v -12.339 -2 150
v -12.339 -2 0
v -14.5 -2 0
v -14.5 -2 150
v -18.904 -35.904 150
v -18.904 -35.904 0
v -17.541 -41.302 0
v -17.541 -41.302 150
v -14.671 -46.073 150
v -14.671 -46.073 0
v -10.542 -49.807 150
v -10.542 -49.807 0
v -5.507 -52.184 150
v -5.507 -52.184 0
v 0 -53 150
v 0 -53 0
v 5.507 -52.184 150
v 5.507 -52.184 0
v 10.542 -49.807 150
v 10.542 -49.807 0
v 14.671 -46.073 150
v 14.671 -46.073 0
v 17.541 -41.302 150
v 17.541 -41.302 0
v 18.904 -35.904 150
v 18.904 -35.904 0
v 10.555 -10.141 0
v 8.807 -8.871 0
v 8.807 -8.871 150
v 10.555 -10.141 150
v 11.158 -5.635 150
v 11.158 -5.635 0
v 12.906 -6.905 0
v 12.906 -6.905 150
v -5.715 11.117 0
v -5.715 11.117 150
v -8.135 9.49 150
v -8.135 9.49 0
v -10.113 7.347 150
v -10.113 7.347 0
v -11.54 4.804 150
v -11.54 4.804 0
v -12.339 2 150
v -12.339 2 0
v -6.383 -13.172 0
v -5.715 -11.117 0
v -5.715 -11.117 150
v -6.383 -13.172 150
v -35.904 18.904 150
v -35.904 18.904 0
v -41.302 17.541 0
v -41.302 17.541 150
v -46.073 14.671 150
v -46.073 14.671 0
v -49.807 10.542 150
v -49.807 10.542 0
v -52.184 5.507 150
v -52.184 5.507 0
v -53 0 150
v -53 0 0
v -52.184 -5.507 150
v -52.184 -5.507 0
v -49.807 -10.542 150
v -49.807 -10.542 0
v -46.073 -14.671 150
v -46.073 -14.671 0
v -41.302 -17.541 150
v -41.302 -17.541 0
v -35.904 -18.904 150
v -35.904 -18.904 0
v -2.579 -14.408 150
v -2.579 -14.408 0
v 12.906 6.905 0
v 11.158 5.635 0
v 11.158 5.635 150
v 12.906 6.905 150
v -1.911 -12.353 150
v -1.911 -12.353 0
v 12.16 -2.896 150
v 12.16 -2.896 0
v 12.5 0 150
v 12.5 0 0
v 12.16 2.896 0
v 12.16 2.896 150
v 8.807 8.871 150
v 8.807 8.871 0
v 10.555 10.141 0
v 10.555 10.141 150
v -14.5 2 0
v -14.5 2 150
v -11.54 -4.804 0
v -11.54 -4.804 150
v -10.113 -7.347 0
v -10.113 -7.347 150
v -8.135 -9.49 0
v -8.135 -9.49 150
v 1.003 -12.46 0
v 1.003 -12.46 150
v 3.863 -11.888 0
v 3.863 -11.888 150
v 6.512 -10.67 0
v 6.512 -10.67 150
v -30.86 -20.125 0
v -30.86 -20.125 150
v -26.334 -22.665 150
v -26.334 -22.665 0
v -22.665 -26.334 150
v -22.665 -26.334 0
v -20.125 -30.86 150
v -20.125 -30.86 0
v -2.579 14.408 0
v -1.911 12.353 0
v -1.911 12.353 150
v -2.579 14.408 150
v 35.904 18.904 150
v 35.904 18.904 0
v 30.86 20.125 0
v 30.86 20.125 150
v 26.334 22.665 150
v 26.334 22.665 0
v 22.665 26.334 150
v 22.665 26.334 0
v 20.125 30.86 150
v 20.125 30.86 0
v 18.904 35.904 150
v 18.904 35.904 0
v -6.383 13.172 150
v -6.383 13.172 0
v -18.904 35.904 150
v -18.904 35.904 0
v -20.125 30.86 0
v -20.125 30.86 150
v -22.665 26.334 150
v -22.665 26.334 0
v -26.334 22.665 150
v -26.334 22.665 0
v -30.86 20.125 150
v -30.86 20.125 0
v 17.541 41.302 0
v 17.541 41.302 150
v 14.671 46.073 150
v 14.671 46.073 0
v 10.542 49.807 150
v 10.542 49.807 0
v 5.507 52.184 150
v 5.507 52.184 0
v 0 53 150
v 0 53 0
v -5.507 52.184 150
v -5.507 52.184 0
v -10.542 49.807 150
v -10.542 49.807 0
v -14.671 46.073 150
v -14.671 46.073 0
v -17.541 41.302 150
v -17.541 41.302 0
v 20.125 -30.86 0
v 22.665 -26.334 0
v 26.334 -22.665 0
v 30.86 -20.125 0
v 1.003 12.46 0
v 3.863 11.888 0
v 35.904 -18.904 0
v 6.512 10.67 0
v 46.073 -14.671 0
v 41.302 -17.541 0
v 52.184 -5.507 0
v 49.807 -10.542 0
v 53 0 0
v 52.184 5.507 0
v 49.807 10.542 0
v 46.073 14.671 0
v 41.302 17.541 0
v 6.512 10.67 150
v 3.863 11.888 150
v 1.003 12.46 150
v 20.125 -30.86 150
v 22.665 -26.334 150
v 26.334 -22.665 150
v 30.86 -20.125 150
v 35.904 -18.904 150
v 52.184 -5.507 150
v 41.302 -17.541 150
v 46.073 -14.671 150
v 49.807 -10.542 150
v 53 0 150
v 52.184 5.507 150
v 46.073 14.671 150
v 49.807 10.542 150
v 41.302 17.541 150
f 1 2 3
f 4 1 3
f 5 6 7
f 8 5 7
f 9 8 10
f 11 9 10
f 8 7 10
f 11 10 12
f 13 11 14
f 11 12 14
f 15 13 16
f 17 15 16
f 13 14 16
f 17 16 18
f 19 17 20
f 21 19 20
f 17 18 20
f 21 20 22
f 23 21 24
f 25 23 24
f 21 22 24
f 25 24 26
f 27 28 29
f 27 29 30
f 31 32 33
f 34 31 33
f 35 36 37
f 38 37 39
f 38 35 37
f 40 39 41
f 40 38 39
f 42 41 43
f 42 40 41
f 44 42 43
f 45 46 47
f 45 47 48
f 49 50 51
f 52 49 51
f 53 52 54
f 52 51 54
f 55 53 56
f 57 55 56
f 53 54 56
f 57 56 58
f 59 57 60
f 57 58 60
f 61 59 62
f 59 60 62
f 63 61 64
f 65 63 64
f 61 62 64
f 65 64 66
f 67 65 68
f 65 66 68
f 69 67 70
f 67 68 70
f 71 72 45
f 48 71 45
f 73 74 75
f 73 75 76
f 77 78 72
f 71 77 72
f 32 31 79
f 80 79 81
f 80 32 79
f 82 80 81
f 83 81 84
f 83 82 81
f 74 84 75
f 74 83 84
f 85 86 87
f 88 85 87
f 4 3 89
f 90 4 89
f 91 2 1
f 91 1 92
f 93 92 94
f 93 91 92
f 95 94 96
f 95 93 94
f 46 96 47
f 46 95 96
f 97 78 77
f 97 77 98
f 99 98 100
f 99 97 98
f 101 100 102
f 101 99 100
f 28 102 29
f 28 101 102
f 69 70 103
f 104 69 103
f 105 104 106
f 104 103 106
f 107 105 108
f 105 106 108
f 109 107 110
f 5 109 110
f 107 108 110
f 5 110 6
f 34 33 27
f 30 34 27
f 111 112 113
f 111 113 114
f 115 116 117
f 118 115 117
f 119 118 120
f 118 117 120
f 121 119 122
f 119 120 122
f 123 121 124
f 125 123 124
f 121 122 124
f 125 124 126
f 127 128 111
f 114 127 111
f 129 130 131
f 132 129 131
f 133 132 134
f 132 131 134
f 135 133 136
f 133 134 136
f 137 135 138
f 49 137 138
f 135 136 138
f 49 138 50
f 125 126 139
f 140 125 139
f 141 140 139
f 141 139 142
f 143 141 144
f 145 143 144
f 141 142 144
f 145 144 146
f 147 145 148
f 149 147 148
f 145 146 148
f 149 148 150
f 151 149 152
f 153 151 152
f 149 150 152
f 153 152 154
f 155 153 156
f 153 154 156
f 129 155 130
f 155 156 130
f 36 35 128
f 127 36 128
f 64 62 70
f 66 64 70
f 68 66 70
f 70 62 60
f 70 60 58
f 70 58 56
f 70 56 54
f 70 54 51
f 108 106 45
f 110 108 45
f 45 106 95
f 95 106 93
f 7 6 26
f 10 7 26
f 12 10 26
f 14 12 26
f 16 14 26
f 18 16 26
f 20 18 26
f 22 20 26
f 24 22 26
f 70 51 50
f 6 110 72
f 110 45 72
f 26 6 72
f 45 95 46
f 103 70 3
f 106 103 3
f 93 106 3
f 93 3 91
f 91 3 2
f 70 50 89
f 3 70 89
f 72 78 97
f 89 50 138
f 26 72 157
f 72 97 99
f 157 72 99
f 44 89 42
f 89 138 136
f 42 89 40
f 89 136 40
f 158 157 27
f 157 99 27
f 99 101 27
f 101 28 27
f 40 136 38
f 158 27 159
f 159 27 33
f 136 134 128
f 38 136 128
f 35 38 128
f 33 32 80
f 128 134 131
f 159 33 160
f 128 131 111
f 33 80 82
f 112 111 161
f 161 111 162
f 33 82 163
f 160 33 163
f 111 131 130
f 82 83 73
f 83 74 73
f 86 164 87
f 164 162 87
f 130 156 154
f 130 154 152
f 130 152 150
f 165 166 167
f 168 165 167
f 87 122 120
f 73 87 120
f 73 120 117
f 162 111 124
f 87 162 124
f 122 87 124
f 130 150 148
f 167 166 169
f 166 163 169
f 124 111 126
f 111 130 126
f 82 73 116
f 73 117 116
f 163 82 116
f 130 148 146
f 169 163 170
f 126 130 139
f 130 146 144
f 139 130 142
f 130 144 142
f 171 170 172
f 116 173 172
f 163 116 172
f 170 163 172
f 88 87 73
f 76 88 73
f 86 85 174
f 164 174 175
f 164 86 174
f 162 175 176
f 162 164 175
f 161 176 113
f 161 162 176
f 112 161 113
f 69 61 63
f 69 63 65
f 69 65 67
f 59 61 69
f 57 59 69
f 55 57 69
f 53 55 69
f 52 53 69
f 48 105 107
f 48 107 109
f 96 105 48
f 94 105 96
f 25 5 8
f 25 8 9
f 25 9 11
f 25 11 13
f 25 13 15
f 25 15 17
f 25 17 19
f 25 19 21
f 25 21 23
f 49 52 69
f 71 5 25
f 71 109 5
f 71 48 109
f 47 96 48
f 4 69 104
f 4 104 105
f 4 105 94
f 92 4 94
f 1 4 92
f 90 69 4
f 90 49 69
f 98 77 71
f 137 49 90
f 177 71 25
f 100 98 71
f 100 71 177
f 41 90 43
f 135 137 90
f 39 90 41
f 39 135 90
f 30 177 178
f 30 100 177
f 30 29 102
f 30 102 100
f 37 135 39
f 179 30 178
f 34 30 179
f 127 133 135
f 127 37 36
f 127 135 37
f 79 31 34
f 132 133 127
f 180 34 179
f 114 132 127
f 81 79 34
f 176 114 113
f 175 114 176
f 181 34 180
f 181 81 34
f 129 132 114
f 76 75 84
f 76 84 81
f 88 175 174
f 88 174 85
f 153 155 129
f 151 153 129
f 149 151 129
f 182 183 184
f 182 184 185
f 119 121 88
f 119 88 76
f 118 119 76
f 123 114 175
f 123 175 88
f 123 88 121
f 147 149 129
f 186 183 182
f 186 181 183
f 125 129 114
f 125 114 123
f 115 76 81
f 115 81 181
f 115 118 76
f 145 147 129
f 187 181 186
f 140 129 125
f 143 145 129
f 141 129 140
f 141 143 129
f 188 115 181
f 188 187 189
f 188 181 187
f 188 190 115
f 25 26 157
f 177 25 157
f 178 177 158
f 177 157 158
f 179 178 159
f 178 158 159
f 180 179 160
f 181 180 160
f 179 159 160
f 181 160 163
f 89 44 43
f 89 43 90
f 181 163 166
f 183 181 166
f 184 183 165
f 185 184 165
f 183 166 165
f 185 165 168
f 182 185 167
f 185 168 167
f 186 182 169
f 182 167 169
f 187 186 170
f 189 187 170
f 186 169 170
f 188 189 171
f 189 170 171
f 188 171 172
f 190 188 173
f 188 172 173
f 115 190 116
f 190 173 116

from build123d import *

# Parameters (mm, degrees)
SKETCH1_R           = 12.5
SKETCH1_R_2         = 19
BOSS_EXTRUDE1_DEPTH = 150
SKETCH2_W           = 4
SKETCH2_H           = 4
CUT_EXTRUDE1_DEPTH  = 151
CIRPATTERN1_COUNT   = 5


with BuildPart() as part:
    # Sketch1 → Boss-Extrude1 (new body)
    with BuildSketch(Plane.XY):
        with BuildLine():
            ThreePointArc((35.904326013, -18.904326024), (15, 0), (35.904326013, 18.904326024))
            ThreePointArc((35.904326013, 18.904326024), (24.373623204, 24.373623204), (18.904326024, 35.904326013))
            ThreePointArc((18.904326024, 35.904326013), (18.976066432, 34.953363922), (19, 34))
            ThreePointArc((19, 34), (-0.953363922, 15.023933568), (-18.904326024, 35.904326013))
            ThreePointArc((-18.904326024, 35.904326013), (-24.373623204, 24.373623204), (-35.904326013, 18.904326024))
            ThreePointArc((-35.904326013, 18.904326024), (-21.25602484, 14.092235349), (-15, 0))
            ThreePointArc((-15, 0), (-21.25602484, -14.092235349), (-35.904326013, -18.904326024))
            ThreePointArc((-35.904326013, -18.904326024), (-24.373623204, -24.373623204), (-18.904326024, -35.904326013))
            ThreePointArc((-18.904326024, -35.904326013), (-0.953363922, -15.023933568), (19, -34))
            ThreePointArc((19, -34), (18.976066432, -34.953363922), (18.904326024, -35.904326013))
            ThreePointArc((18.904326024, -35.904326013), (24.373623204, -24.373623204), (35.904326013, -18.904326024))
        make_face()
        Circle(SKETCH1_R, mode=Mode.SUBTRACT)
        with Locations((0, 34)):
            Circle(SKETCH1_R_2)
        with Locations((-34, 0)):
            Circle(SKETCH1_R_2)
        with Locations((0, -34)):
            Circle(SKETCH1_R_2)
        with Locations((34, 0)):
            Circle(SKETCH1_R_2)
    extrude(amount=BOSS_EXTRUDE1_DEPTH)

    # Sketch2 → Cut-Extrude1 (cut, through all)
    with BuildSketch(Plane(origin=(0, 0, 0), x_dir=(-1, 0, 0), z_dir=(0, 0, -1))):
        with Locations((12.5, 0)):
            Rectangle(SKETCH2_W, SKETCH2_H)
    cut_extrude1 = extrude(amount=-CUT_EXTRUDE1_DEPTH, mode=Mode.SUBTRACT)

    # CirPattern1: Cut-Extrude1 ×5 about axis
    cirpattern1_axis = Axis((0, 0, 0), (0, 0, 1))
    for i in range(1, CIRPATTERN1_COUNT):
        add(cut_extrude1.rotate(cirpattern1_axis, i * 360 / CIRPATTERN1_COUNT), mode=Mode.SUBTRACT)


solid = part.part
